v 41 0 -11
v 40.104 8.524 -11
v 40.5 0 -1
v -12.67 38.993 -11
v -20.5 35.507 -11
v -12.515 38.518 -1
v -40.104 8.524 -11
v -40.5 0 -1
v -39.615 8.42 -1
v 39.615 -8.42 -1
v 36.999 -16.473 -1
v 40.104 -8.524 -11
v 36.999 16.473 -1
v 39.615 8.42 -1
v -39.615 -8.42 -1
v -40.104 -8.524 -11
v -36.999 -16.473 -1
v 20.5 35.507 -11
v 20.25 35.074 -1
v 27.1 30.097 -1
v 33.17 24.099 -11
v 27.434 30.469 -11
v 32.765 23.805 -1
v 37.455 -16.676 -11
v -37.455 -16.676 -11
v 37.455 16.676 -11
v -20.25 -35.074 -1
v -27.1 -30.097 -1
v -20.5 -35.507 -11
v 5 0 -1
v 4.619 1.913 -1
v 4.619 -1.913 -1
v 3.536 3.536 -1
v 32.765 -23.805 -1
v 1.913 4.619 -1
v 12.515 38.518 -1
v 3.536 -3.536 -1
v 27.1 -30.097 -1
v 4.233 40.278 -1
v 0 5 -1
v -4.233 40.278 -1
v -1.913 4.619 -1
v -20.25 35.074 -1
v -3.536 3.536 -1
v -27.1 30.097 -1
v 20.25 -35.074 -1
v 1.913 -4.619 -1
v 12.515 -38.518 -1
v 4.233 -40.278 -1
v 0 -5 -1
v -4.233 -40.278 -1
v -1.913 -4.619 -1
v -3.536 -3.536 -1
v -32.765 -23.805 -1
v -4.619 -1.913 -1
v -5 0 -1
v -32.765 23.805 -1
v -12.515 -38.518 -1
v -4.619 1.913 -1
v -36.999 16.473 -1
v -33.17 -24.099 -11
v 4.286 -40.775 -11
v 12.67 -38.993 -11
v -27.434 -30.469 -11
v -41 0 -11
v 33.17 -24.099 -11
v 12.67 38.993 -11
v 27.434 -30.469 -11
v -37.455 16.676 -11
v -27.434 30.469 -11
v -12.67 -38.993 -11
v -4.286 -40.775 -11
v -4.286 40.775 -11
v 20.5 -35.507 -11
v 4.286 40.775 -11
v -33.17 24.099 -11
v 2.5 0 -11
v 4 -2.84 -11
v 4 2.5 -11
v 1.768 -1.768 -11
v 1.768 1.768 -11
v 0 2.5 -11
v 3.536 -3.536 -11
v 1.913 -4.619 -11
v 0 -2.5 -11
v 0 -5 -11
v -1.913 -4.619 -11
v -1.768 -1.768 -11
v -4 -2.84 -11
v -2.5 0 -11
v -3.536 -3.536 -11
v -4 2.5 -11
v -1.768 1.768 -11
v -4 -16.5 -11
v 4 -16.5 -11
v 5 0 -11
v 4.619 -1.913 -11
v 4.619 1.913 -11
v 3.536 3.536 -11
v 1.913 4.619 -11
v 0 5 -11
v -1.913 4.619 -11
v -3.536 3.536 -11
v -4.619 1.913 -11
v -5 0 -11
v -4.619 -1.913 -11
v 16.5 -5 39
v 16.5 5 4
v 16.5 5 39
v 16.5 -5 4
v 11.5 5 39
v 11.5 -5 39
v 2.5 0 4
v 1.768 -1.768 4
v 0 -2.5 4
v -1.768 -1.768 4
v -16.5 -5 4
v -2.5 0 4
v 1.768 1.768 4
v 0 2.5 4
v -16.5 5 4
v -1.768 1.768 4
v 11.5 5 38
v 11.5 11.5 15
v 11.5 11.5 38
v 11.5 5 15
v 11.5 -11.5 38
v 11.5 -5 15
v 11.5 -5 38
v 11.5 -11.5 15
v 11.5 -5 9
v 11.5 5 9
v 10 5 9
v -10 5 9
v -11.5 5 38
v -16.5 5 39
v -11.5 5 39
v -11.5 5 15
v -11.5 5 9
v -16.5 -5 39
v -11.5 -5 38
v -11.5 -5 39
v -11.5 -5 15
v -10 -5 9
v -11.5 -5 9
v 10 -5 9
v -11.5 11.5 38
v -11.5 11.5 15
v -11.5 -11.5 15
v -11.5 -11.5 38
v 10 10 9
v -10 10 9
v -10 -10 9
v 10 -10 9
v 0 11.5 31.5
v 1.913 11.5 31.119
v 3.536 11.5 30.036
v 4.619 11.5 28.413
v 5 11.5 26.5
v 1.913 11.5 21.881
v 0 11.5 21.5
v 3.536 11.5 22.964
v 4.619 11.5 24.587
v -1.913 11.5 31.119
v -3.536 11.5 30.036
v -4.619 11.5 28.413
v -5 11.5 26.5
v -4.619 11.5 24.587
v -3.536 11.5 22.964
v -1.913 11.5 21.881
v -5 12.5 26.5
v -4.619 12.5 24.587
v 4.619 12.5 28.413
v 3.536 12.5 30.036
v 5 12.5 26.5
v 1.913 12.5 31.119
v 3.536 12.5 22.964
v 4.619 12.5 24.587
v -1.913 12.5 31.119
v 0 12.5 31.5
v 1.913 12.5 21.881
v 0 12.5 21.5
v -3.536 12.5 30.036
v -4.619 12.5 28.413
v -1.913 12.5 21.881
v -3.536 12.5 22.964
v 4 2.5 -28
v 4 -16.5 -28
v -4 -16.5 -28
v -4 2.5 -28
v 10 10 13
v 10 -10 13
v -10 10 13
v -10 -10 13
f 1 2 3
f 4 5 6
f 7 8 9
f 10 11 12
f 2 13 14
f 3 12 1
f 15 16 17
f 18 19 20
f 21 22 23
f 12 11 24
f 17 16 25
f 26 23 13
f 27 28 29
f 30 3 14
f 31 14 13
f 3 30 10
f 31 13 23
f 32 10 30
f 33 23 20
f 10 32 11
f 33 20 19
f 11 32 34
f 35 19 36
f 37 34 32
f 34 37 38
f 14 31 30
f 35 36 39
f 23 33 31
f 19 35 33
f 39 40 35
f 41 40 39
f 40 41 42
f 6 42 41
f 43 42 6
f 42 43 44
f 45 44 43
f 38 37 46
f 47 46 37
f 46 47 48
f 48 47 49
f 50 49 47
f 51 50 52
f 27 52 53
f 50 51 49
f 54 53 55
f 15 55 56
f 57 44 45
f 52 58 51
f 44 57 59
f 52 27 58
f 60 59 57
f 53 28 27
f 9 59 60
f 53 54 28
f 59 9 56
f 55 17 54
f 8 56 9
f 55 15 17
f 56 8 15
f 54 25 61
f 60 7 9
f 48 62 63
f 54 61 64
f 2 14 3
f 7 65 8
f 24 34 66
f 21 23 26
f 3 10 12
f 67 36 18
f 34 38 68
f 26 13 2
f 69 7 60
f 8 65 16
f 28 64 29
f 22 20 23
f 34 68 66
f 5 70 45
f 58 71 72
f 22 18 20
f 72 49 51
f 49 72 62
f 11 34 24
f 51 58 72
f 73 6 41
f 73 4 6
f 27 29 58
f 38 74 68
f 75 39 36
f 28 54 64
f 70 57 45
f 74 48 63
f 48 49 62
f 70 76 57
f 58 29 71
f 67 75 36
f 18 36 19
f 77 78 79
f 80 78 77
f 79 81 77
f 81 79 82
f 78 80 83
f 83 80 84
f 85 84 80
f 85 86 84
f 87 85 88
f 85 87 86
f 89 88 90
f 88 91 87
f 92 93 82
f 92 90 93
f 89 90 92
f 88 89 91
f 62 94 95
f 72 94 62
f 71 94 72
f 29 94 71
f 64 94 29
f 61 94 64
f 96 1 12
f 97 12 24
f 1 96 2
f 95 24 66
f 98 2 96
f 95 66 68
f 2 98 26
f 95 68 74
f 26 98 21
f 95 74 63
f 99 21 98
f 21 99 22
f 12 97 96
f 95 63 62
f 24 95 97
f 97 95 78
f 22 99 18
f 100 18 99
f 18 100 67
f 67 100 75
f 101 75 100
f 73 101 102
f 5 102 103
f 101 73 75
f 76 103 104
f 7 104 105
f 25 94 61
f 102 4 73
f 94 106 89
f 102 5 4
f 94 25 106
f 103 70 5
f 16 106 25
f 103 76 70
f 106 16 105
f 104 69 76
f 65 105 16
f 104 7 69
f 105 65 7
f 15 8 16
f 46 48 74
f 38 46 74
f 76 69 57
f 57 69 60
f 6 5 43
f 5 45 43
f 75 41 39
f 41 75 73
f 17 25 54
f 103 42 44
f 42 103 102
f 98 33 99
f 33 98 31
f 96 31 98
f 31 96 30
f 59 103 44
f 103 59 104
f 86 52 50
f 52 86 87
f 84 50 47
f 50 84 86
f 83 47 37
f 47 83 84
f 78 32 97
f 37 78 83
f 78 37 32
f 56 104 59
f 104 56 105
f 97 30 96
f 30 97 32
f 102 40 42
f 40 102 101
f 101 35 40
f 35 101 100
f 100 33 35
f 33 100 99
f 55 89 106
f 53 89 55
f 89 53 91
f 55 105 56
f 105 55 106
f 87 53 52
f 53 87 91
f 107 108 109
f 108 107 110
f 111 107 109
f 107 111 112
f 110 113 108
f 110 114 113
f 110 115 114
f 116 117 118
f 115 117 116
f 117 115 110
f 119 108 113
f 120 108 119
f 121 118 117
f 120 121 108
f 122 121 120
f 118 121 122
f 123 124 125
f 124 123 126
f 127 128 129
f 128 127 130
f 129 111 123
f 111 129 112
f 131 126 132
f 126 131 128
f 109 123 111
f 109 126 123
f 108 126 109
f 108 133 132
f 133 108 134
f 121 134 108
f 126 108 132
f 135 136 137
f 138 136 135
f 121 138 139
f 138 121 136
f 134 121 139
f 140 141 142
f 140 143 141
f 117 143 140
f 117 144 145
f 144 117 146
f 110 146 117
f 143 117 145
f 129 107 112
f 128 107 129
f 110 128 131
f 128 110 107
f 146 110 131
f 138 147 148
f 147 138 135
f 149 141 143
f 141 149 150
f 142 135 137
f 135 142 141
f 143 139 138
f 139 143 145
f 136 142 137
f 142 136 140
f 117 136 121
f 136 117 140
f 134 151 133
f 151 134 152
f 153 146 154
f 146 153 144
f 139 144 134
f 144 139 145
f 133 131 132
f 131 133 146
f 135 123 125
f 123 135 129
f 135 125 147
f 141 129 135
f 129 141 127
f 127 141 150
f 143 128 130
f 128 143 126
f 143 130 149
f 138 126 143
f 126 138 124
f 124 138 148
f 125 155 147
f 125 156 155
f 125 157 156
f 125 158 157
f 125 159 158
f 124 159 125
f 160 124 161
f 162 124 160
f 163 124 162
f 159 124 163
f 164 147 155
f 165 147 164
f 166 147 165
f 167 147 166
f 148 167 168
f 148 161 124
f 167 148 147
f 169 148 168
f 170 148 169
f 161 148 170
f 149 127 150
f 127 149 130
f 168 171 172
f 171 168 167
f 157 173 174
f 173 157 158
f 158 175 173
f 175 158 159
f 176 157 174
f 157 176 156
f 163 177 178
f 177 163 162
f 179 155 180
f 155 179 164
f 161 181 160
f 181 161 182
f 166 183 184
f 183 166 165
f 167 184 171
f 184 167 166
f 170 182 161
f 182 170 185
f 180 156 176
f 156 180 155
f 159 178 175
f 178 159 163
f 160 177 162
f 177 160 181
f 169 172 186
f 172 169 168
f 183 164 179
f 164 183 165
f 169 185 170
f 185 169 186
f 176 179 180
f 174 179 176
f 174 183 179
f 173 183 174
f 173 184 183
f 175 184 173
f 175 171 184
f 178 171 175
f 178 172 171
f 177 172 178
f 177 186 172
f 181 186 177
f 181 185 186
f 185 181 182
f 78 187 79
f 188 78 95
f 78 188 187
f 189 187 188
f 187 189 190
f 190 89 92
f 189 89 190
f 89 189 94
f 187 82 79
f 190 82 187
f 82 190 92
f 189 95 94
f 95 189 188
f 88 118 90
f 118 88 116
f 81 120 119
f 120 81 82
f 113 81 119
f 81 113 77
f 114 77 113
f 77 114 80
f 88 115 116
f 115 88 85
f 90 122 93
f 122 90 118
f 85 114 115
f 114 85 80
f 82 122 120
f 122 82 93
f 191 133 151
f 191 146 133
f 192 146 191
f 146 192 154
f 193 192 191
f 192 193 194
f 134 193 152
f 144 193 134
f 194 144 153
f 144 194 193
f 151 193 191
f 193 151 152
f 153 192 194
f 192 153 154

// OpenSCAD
// file: ../library/meca-comps/meca-comps.scad
// <img src="https://raw.githubusercontent.com/Acelspace-Projects/Acelspace/main/OpenSCAD/library/meca-comps/aileron.png">

module aileron(m, n, E, p, epaisseur) {
    CubePoints = [
        [  0,       0,         0 ], //0
        [  E, m-(p+n),         0 ], //1
        [  E,     m-p,         0 ], //2
        [  0,       m,         0 ], //3
        [  0,       0, epaisseur ], //4
        [  E, m-(p+n), epaisseur ], //5
        [  E,     m-p, epaisseur ], //6
        [  0,       m, epaisseur ]  //7
    ];
    
    CubeFaces = [
        [0,1,2,3], // bottom
        [4,5,1,0], // front
        [7,6,5,4], // top
        [5,6,2,1], // right
        [6,7,3,2], // back
        [7,4,0,3]  // left
    ];
    
    translate([0,epaisseur/2,0]) rotate(a=[90,0,0]) color("grey") polyhedron( CubePoints, CubeFaces );
}

// <img src="https://raw.githubusercontent.com/Acelspace-Projects/Acelspace/main/OpenSCAD/library/meca-comps/bague_creuse.png">

module bague_creuse(diametre_externe, diametre_interieur, epaisseur) {
    assert(diametre_externe > diametre_interieur, "Le diametre extérieur doit être plus grand que diametre intérieur")
    difference() {
        cylinder(h=epaisseur, d=diametre_externe);
        translate([0,0,-1]) cylinder(h=epaisseur+2, d=diametre_interieur);
    }
}

// <img src="https://raw.githubusercontent.com/Acelspace-Projects/Acelspace/main/OpenSCAD/library/meca-comps/bague_de_poussee.png">

module bague_de_poussee(
    diametre_exterieur,
    diametre_intermediaire,
    diametre_interieur,
    epaisseur_exterieure,
    epaisseur_interieure
) {
    union() {
        bague_creuse(diametre_exterieur, diametre_interieur, epaisseur_exterieure, $fn=50);
        bague_creuse(diametre_intermediaire, diametre_interieur, epaisseur_interieure, $fn=50);
    }
}

// <img src="https://raw.githubusercontent.com/Acelspace-Projects/Acelspace/main/OpenSCAD/library/meca-comps/bague_pleine.png">

module bague_pleine(diametre, epaisseur) {
    cylinder(h=epaisseur, d=diametre);
}

// <img src="https://raw.githubusercontent.com/Acelspace-Projects/Acelspace/main/OpenSCAD/library/meca-comps/equerre.png">

module equerre(h1, h2, l, e){
    union() {
        cube(size=[h1,e,l]);
        cube(size=[e,h2,l]);
    }
}

// <img src="https://raw.githubusercontent.com/Acelspace-Projects/Acelspace/main/OpenSCAD/library/meca-comps/guide_rampe.png">

module guide_rampe() {
    rotate([-90,0,0]) color("grey") union() {
        cylinder(d= 7, h=13);
        cylinder(d=12, h= 5);
        translate([0,0,10]) cylinder(d=12, h=3);
    }
}

// <img src="https://raw.githubusercontent.com/Acelspace-Projects/Acelspace/main/OpenSCAD/library/meca-comps/ogive.png">

module ogive(hauteur, diametre, epaisseur) {
    difference() {
        ogive_pleine(hauteur, diametre);
        translate([0,0,-1 ]) ogive_pleine(hauteur-epaisseur+1, diametre-epaisseur);
    }
}

// <img src="https://raw.githubusercontent.com/Acelspace-Projects/Acelspace/main/OpenSCAD/library/meca-comps/ogive_pleine.png">

module ogive_pleine(hauteur, diametre) {
    h_o = hauteur;
    d_o = diametre;
    r_o = d_o/2;

    rotate_extrude(angle=360, convexity=2)
    rotate(a=[0,0,90]) 
    intersection() {
        square([h_o,r_o]);
        resize([2*h_o, 0, 0]) circle(r_o, $fn=100);
    }
}

// <img src="https://raw.githubusercontent.com/Acelspace-Projects/Acelspace/main/OpenSCAD/library/meca-comps/ressort.png">

module ressort(diametre=10, section=1, hauteur=20, nb_spire=10){
    //
    // Mendel90
    //
    // GNU GPL v2
    // nop.head@gmail.com
    // hydraraptor.blogspot.com
    //
    // Springs
    //

    extruder_spring = [ 7,    1, 10, 5];
    hob_spring      = [12, 0.75, 10, 6];

    function spring_od(type)     = type[0];
    function spring_gauge(type)  = type[1];
    function spring_length(type) = type[2];
    function spring_coils(type)  = type[3];

    // taken from openscad example 20
    module coil(r1 = 100, r2 = 10, h = 100, twists)
    {
        hr = h / (twists * 2);
        stepsize = 1/16;
        module segment(i1, i2) {
            alpha1 = i1 * 360*r2/hr;
            alpha2 = i2 * 360*r2/hr;
            len1 = sin(acos(i1*2-1))*r2;
            len2 = sin(acos(i2*2-1))*r2;
            if (len1 < 0.01)
                polygon([
                    [ cos(alpha1)*r1, sin(alpha1)*r1 ],
                    [ cos(alpha2)*(r1-len2), sin(alpha2)*(r1-len2) ],
                    [ cos(alpha2)*(r1+len2), sin(alpha2)*(r1+len2) ]
                ]);
            if (len2 < 0.01)
                polygon([
                    [ cos(alpha1)*(r1+len1), sin(alpha1)*(r1+len1) ],
                    [ cos(alpha1)*(r1-len1), sin(alpha1)*(r1-len1) ],
                    [ cos(alpha2)*r1, sin(alpha2)*r1 ],
                ]);
            if (len1 >= 0.01 && len2 >= 0.01)
                polygon([
                    [ cos(alpha1)*(r1+len1), sin(alpha1)*(r1+len1) ],
                    [ cos(alpha1)*(r1-len1), sin(alpha1)*(r1-len1) ],
                    [ cos(alpha2)*(r1-len2), sin(alpha2)*(r1-len2) ],
                    [ cos(alpha2)*(r1+len2), sin(alpha2)*(r1+len2) ]
                ]);
        }
        linear_extrude(height = h, twist = 180*h/hr,
                $fn = (hr/r2)/stepsize, convexity = 5) {
            for (i = [ stepsize : stepsize : 1+stepsize/2 ])
                segment(i-stepsize, min(i, 1));
        }
    }

    module comp_spring(type, l = 0) {
        l = (l == 0) ? spring_length(type) : l;

        coil(r1 = (spring_od(type) - spring_gauge(type)) / 2, r2 = spring_gauge(type) / 2, h = l, twists = spring_coils(type));

        if($children)
            translate([0, 0, l])
                children();
    }
    
    color("grey")
    comp_spring([diametre, section, hauteur, nb_spire]);
}

// Retenue propu

module retenuePropu(L=15, l=12.5) {
    rotate([180,0,0]) 
    translate([25,0,2]) {
        // plaque epaisse - 5mm
        color("lightgrey") 
        translate([L/2+2.5,0,2.5]) 
        cube([L, l, 5],true);
        // plaque U - 4mm
        color("grey") 
        difference() {
            translate([L/2+2.5,0,7]) 
            cube([L, l, 4],true);
            translate([8,0,7.5]) 
            cube([12, 5, 6],true);
        }
        // pene
        color("dimgray") 
        translate([0,0,7]) 
        difference() {
            translate([5,0,0]) 
            cube([12, 4, 4],true);
            translate([-1,0,1]) 
            rotate([0,45,0]) 
            cube([5, 5, 10],true);
        }
        // plaque dessus - 1mm
        color("lightgrey")
        difference() {
            translate([L/2+2.5,0,9.5]) 
            cube([L, l, 1],true);
            translate([9,0,9.5]) 
            cube([7, 2.5, 2],true);
        }
        // vis
        color("grey") 
        translate([L/2+2.5,0,9])
        cylinder(h=5,d=2);
    }
}

// <img src="https://raw.githubusercontent.com/Acelspace-Projects/Acelspace/main/OpenSCAD/library/meca-comps/tube.png">

module tube(hauteur, diametre, epaisseur) {
    difference() {
        cylinder(h=hauteur, d=diametre);
        translate([0,0,-1]) cylinder(h=hauteur+2, d=diametre-epaisseur*2);
    }
}
// main file
use <../library/meca-comps/meca-comps.scad>

module bloc_camera(d_int=96) {

// //ogive (réduction du diamètre)
// difference(){
//     translate([0,0,200]) cylinder(h = 70, r1 = 50, r2 = 42.5, center = false);
//     translate([0,0,198.4]) cylinder(h = 72, r1 = 35, r2 = 27, center = false);
// }

// //ogive (dôme)
// translate([0,0,270]) 
// difference(){
//     #sphere(r = 42.5);
//     translate([0,0,-50]) cube(100,true);
//     #sphere(r = 39.5);
// }

//support caméra
// difference(){
//     translate([0,0,200]) cylinder(h = 20, r1 = 50, r2 = 30, center = false);
//     translate([0,0,202]) cylinder(h = 19.4, r1 = 35, r2 = 24.55, center = false);
// }

//batterie
// color([0.9, 0, 0]) {
//     translate([-20,0,195]) cube([51, 34, 4]);
// }

// support
translate([0, 0, -11])
color("white")
difference(){
    cylinder(h=10, d1=82, d2=81);
    translate([0,0,-1])
    cylinder(h=12,d=10);
};

// servo-moteur
color([50/255,50/255,255/255])
translate([0,-7,8.5-28])
cube([8, 19, 17],true);
// color([50/255,50/255,255/255])
// translate([23/2+10,0,17/2+5])
// rotate([0,0,90]) 
// cube([8, 19, 17],true);


// axe
translate([0, 0, -11])
color("grey")
cylinder(h=15,d=5);

// pattes support caméra
union() {
    translate([23/2,-10/2,4])
    cube([5,10,35]);
    translate([-23/2-5,-10/2,4])
    cube([5,10,35]);
    translate([-23/2-5,-10/2,4])
    cube([33,10,5]);
}

// ventilo
color([0.1,0.1,0.1]) 
translate([0,0,11]) 
cube([20,20,4],true);

// caméra
translate([0,0,15]) {
    translate([0,0,23/2])
    color("dimgrey") 
    cube(23,true);
    translate([0,23/2+1,23/2])
    color("navy")
    rotate([90,0,0])
    cylinder(h=1,d=10);
}

}

bloc_camera();
